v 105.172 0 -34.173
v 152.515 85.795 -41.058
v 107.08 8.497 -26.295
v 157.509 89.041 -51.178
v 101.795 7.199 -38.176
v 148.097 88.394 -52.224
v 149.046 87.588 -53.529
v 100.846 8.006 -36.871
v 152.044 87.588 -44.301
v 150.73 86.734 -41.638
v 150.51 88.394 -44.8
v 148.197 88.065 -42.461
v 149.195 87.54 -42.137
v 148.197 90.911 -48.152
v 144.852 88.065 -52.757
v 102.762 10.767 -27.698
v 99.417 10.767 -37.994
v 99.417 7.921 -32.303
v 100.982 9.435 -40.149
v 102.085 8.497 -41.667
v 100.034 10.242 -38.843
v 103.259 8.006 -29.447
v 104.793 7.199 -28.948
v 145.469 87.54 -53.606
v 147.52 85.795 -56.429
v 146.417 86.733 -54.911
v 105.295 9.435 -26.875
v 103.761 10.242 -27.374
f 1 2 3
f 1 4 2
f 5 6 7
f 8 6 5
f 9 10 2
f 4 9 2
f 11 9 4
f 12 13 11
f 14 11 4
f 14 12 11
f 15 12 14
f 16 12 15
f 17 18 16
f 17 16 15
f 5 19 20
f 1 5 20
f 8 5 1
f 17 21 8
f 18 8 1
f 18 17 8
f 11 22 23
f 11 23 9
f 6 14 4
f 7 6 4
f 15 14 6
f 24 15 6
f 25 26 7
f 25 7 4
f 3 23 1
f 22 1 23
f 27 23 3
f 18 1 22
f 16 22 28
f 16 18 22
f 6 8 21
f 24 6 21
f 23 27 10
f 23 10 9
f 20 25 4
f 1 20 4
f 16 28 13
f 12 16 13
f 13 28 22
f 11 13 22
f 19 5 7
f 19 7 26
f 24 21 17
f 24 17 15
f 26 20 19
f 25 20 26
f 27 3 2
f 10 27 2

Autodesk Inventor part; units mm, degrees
sketch "Boceto1" plane through (0, 0, 0) normal (0, 1, 0) x (-1, 0, 0)
  line L0 (65, 89.4648) -> (105.1722, -34.1725)
  line L1 (105.1722, -34.1725) -> (0, -110.5846)
  line L2 (0, -110.5846) -> (-105.1722, -34.1725)
  line L3 (-105.1722, -34.1725) -> (-65, 89.4648)
  line L4 (-65, 89.4648) -> (65, 89.4648)
  line L5 (0, 0) -> (178.9296, 0) construction
  line L6 (178.9296, 0) -> (178.9296, 178.9296) construction
  line L7 (178.9296, 178.9296) -> (0, 178.9296) construction
  line L8 (0, 178.9296) -> (0, 0) construction
  line L9 (178.9296, 178.9296) -> (0, 89.4648)
  dimension "d1" = 289.5143
  dimension "d2" = 26.565
  dimension "d108" = 130
extrude "Extrusión1" add sketch "Boceto1" along normal blind 289.5143 draft 26.565
sketch "Boceto2" plane through (0, 289.5143, 0) normal (0, 1, 0) x (1, 0, 0)
  line L0 (0, -80.8118) -> (-76.8566, -24.9722)
  line L1 (-76.8566, -24.9722) -> (-47.5, 65.3781)
  line L2 (-47.5, 65.3781) -> (47.5, 65.3781)
  line L3 (47.5, 65.3781) -> (76.8566, -24.9722)
  line L4 (76.8566, -24.9722) -> (0, -80.8118)
  point P0 (0, 0)
  point P1 (0, 0)
  dimension "L" = 95
extrude "Extrusión2" cut sketch "Boceto2" against normal blind 289.5143 draft 26.565 keep common part
sketch "Boceto3" plane through (65, 0, 89.4648) normal (0.8506508, -0.4472136, 0.2763932) x (0.309017, 0, -0.9510565)
  line L0 (65, 170.2767) -> (162.346, 99.5507) projected
  line L1 (-32.346, 99.5507) -> (65, 170.2767) projected
  line L2 (0, 0) -> (-32.346, 99.5507) projected
  line L3 (0, 0) -> (130, 0) projected
  line L4 (130, 0) -> (162.346, 99.5507) projected
  line L5 (151.1781, 95.922) -> (65, 158.534)
  line L6 (65, 158.534) -> (-21.1781, 95.922)
  line L7 (-21.1781, 95.922) -> (6.9022, 9.5)
  line L8 (6.9022, 9.5) -> (123.0978, 9.5)
  line L9 (123.0978, 9.5) -> (151.1781, 95.922)
  point P0 (65, -40.0099)
  dimension "D" = 9.5
extrude "Extrusión3" cut sketch "Boceto3" against normal blind 189.5143 contours L9 L8 L7 L6 L5
sketch "Boceto4" plane through (105.1722, 0, -34.1725) normal (0.5257311, -0.4472136, -0.7236068) x (-0.809017, 0, -0.5877853)
  line L0 (65, 170.2767) -> (162.346, 99.5507) projected
  line L1 (-32.346, 99.5507) -> (65, 170.2767) projected
  line L2 (0, 0) -> (-32.346, 99.5507) projected
  line L3 (0, 0) -> (130, 0) projected
  line L4 (130, 0) -> (162.346, 99.5507) projected
  line L5 (123.0978, 9.5) -> (6.9022, 9.5)
  line L6 (6.9022, 9.5) -> (-21.1781, 95.922)
  line L7 (-21.1781, 95.922) -> (65, 158.534)
  line L8 (65, 158.534) -> (151.1781, 95.922)
  line L9 (151.1781, 95.922) -> (123.0978, 9.5)
  point P0 (65, -40.0099)
  dimension "d14" = 9.5
extrude "Extrusión4" cut sketch "Boceto4" against normal blind 189.5143 contours L5 L6 L7 L8 L9
sketch "Boceto5" plane through (0, 0, 0) normal (0, -1, 0) x (1, 0, 0)
  line L0 (105.1722, -34.1725) -> (0, -110.5846) projected
  line L1 (65, 89.4648) -> (105.1722, -34.1725) projected
  line L2 (-65, 89.4648) -> (65, 89.4648) projected
  line L3 (-105.1722, -34.1725) -> (-65, 89.4648) projected
  line L4 (0, -110.5846) -> (-105.1722, -34.1725) projected
  line L5 (58.0978, 79.9648) -> (94.0043, -30.5438)
  line L6 (94.0043, -30.5438) -> (0, -98.842)
  line L7 (0, -98.842) -> (-94.0043, -30.5438)
  line L8 (-94.0043, -30.5438) -> (-58.0978, 79.9648)
  line L9 (-58.0978, 79.9648) -> (58.0978, 79.9648)
  point P0 (0, 0)
  dimension "d17" = 9.5
extrude "Extrusión5" cut sketch "Boceto5" against normal blind 189.5143 contours L5 L6 L7 L8 L9
sketch "Boceto6" plane through (47.5, 289.5143, -65.3781) normal (0, 0.4472136, -0.8944272) x (-1, 0, 0)
  line L0 (47.5, -224.1361) -> (144.846, -153.4101) projected
  line L1 (95, 0) -> (144.846, -153.4101) projected
  line L2 (95, 0) -> (0, 0) projected
  line L3 (0, 0) -> (-49.846, -153.4101) projected
  line L4 (-49.846, -153.4101) -> (47.5, -224.1361) projected
  line L5 (133.6781, -149.7814) -> (47.5, -212.3935)
  line L6 (47.5, -212.3935) -> (-38.6781, -149.7814)
  line L7 (-38.6781, -149.7814) -> (6.9022, -9.5)
  line L8 (6.9022, -9.5) -> (88.0978, -9.5)
  line L9 (88.0978, -9.5) -> (133.6781, -149.7814)
  point P0 (47.5, -229.7114)
  dimension "d20" = 9.5
extrude "Extrusión6" cut sketch "Boceto6" against normal blind 189.5143 contours L5 L6 L7 L8 L9
sketch "Boceto7" plane through (0, 0, -110.5846) normal (-0.5257311, -0.4472136, -0.7236068) x (-0.809017, 0, 0.5877853)
  line L0 (65, 170.2767) -> (162.346, 99.5507) projected
  line L1 (-32.346, 99.5507) -> (65, 170.2767) projected
  line L2 (0, 0) -> (-32.346, 99.5507) projected
  line L3 (0, 0) -> (130, 0) projected
  line L4 (130, 0) -> (162.346, 99.5507) projected
  line L5 (151.1781, 95.922) -> (65, 158.534)
  line L6 (65, 158.534) -> (-21.1781, 95.922)
  line L7 (-21.1781, 95.922) -> (6.9022, 9.5)
  line L8 (6.9022, 9.5) -> (123.0978, 9.5)
  line L9 (123.0978, 9.5) -> (151.1781, 95.922)
  point P0 (65, -40.0099)
  dimension "d23" = 9.5
extrude "Extrusión7" cut sketch "Boceto7" against normal blind 189.5143 contours L9 L8 L7 L6 L5
sketch "Boceto8" plane through (76.8566, 289.5143, 24.9722) normal (0.8506508, 0.4472136, -0.2763932) x (-0.309017, 0, -0.9510565)
  line L0 (47.5, -224.1361) -> (144.846, -153.4101) projected
  line L1 (95, 0) -> (144.846, -153.4101) projected
  line L2 (95, 0) -> (0, 0) projected
  line L3 (0, 0) -> (-49.846, -153.4101) projected
  line L4 (-49.846, -153.4101) -> (47.5, -224.1361) projected
  line L5 (47.5, -212.3935) -> (133.6781, -149.7814)
  line L6 (133.6781, -149.7814) -> (88.0978, -9.5)
  line L7 (88.0978, -9.5) -> (6.9022, -9.5)
  line L8 (6.9022, -9.5) -> (-38.6781, -149.7814)
  line L9 (-38.6781, -149.7814) -> (47.5, -212.3935)
  point P0 (47.5, -229.7114)
  dimension "d26" = 9.5
extrude "Extrusión8" cut sketch "Boceto8" against normal blind 189.5143 contours L9 L8 L7 L6 L5
sketch "Boceto9" plane through (0, 289.5143, 0) normal (0, 1, 0) x (1, 0, 0)
  line L0 (78.7643, -17.095) -> (-82.4461, -69.4755) projected
  line L1 (-47.5, 65.3781) -> (47.5, 65.3781) projected
  line L2 (-76.8566, -24.9722) -> (-47.5, 65.3781) projected
  line L3 (0, -80.8118) -> (-76.8566, -24.9722) projected
  line L4 (76.8566, -24.9722) -> (0, -80.8118) projected
  line L5 (47.5, 65.3781) -> (76.8566, -24.9722) projected
  line L6 (0, -69.0692) -> (-65.6887, -21.3436)
  line L7 (-65.6887, -21.3436) -> (-40.5978, 55.8781)
  line L8 (-40.5978, 55.8781) -> (40.5978, 55.8781)
  line L9 (40.5978, 55.8781) -> (65.6887, -21.3436)
  line L10 (65.6887, -21.3436) -> (0, -69.0692)
  point P0 (0, 0)
  dimension "d29" = 9.5
extrude "Extrusión9" cut sketch "Boceto9" against normal blind 189.5143 contours L10 L6 L0 | L0 L6 L7 L8 L9
sketch "Boceto10" plane through (-47.5, 289.5143, -65.3781) normal (-0.8506508, 0.4472136, -0.2763932) x (-0.309017, 0, 0.9510565)
  line L0 (-49.846, -153.4101) -> (47.5, -224.1361) projected
  line L1 (47.5, -224.1361) -> (144.846, -153.4101) projected
  line L2 (95, 0) -> (144.846, -153.4101) projected
  line L3 (95, 0) -> (0, 0) projected
  line L4 (0, 0) -> (-49.846, -153.4101) projected
  line L5 (133.6781, -149.7814) -> (47.5, -212.3935)
  line L6 (47.5, -212.3935) -> (-38.6781, -149.7814)
  line L7 (-38.6781, -149.7814) -> (6.9022, -9.5)
  line L8 (6.9022, -9.5) -> (88.0978, -9.5)
  line L9 (88.0978, -9.5) -> (133.6781, -149.7814)
  point P0 (47.5, -229.7114)
  dimension "d32" = 9.5
extrude "Extrusión10" cut sketch "Boceto10" against normal blind 189.5143 contours L5 L6 L7 L8 L9
sketch "Boceto11" plane through (-105.1722, 0, -34.1725) normal (-0.8506508, -0.4472136, 0.2763932) x (0.309017, 0, 0.9510565)
  line L0 (93.5693, 85.4327) -> (113.4241, 91.884) projected
  line L1 (-32.346, 99.5507) -> (65, 170.2767) projected
  line L2 (0, 0) -> (-32.346, 99.5507) projected
  line L3 (0, 0) -> (130, 0) projected
  line L4 (130, 0) -> (162.346, 99.5507) projected
  line L5 (65, 170.2767) -> (162.346, 99.5507) projected
  line L6 (151.1781, 95.922) -> (123.0978, 9.5)
  line L7 (123.0978, 9.5) -> (6.9022, 9.5)
  line L8 (6.9022, 9.5) -> (-21.1781, 95.922)
  line L9 (-21.1781, 95.922) -> (65, 158.534)
  line L10 (65, 158.534) -> (151.1781, 95.922)
  point P0 (65, -40.0099)
  point P1 (48.882, 67.2803)
  point P2 (90.6407, 79.3954)
  point P3 (78.7461, 79.1633)
  dimension "d35" = 9.5
extrude "Extrusión11" cut sketch "Boceto11" against normal blind 189.5143 contours L6 L7 L8 L9 L10
sketch "Boceto12" plane through (-65, 0, 89.4648) normal (0, -0.4472136, 0.8944272) x (1, 0, 0)
  line L0 (6.9022, 9.5) -> (97.7716, 134.5711) projected
  line L1 (-32.346, 99.5507) -> (65, 170.2767) projected
  line L2 (0, 0) -> (-32.346, 99.5507) projected
  line L3 (0, 0) -> (130, 0) projected
  line L4 (130, 0) -> (162.346, 99.5507) projected
  line L5 (65, 170.2767) -> (162.346, 99.5507) projected
  line L6 (151.1781, 95.922) -> (123.0978, 9.5)
  line L7 (123.0978, 9.5) -> (6.9022, 9.5)
  line L8 (6.9022, 9.5) -> (-21.1781, 95.922)
  line L9 (-21.1781, 95.922) -> (65, 158.534)
  line L10 (65, 158.534) -> (151.1781, 95.922)
  point P0 (65, -40.0099)
  point P1 (52.5, 72.2601)
  point P2 (45.5555, 62.7017)
  dimension "d38" = 9.5
extrude "Extrusión12" cut sketch "Boceto12" against normal blind 189.5143 contours L6 L7 L8 L9 L10
sketch "Boceto13" plane through (0, 289.5143, 80.8118) normal (0.5257311, 0.4472136, 0.7236068) x (0.809017, 0, -0.5877853)
  line L0 (-49.846, -153.4101) -> (47.5, -224.1361) projected
  line L1 (47.5, -224.1361) -> (144.846, -153.4101) projected
  line L2 (95, 0) -> (144.846, -153.4101) projected
  line L3 (95, 0) -> (0, 0) projected
  line L4 (0, 0) -> (-49.846, -153.4101) projected
  line L5 (47.5, -212.3935) -> (-38.6781, -149.7814)
  line L6 (-38.6781, -149.7814) -> (6.9022, -9.5)
  line L7 (6.9022, -9.5) -> (88.0978, -9.5)
  line L8 (88.0978, -9.5) -> (133.6781, -149.7814)
  line L9 (133.6781, -149.7814) -> (47.5, -212.3935)
  point P0 (47.5, -229.7114)
  dimension "d41" = 9.5
extrude "Extrusión13" cut sketch "Boceto13" against normal blind 189.5143 contours L5 L6 L7 L8 L9
sketch "Boceto14" plane through (-76.8566, 289.5143, 24.9722) normal (-0.5257311, 0.4472136, 0.7236068) x (0.809017, 0, 0.5877853)
  line L0 (-49.846, -153.4101) -> (47.5, -224.1361) projected
  line L1 (47.5, -224.1361) -> (144.846, -153.4101) projected
  line L2 (95, 0) -> (144.846, -153.4101) projected
  line L3 (95, 0) -> (0, 0) projected
  line L4 (0, 0) -> (-49.846, -153.4101) projected
  line L5 (-38.6781, -149.7814) -> (47.5, -212.3935)
  line L6 (47.5, -212.3935) -> (133.6781, -149.7814)
  line L7 (133.6781, -149.7814) -> (88.0978, -9.5)
  line L8 (88.0978, -9.5) -> (6.9022, -9.5)
  line L9 (6.9022, -9.5) -> (-38.6781, -149.7814)
  point P0 (47.5, -229.7114)
  dimension "d44" = 9.5
extrude "Extrusión14" cut sketch "Boceto14" against normal blind 189.5143 contours L9 L8 L7 L6 L5
ref_plane "Plano de trabajo1" through (47.5, 288.1726, -62.6949) normal (0, 0.4472136, -0.8944272) x (-1, 0, 0)
sketch "Boceto15" plane through (47.5, 288.1726, -62.6949) normal (0, 0.4472136, -0.8944272) x (-1, 0, 0)
  line L0 (6.9022, -9.5) -> (88.0978, -9.5) projected
  line L1 (-38.6781, -149.7814) -> (6.9022, -9.5) projected
  line L2 (47.5, -212.3935) -> (-38.6781, -149.7814) projected
  line L3 (133.6781, -149.7814) -> (47.5, -212.3935) projected
  line L4 (88.0978, -9.5) -> (133.6781, -149.7814) projected
  line L5 (5.0858, -7) -> (89.9142, -7)
  line L6 (89.9142, -7) -> (136.617, -150.7364)
  line L7 (136.617, -150.7364) -> (47.5, -215.4836)
  line L8 (47.5, -215.4836) -> (-41.617, -150.7364)
  line L9 (-41.617, -150.7364) -> (5.0858, -7)
  point P0 (47.5, -229.7114)
  dimension "D2" = 2.5
extrude "Extrusión15" cut sketch "Boceto15" along normal mid plane 1.8 contours L0 L4 L3 L2 L1 | L5 L6 L7 L8 L9
ref_plane "Plano de trabajo2" through (103.595, 1.3416, -32.0017) normal (0.5257311, -0.4472136, -0.7236068) x (-0.809017, 0, -0.5877853)
sketch "Boceto16" plane through (103.595, 1.3416, -32.0017) normal (0.5257311, -0.4472136, -0.7236068) x (-0.809017, 0, -0.5877853)
  line L0 (123.0978, 9.5) -> (6.9022, 9.5) projected
  line L1 (151.1781, 95.922) -> (123.0978, 9.5) projected
  line L2 (65, 158.534) -> (151.1781, 95.922) projected
  line L3 (-21.1781, 95.922) -> (65, 158.534) projected
  line L4 (6.9022, 9.5) -> (-21.1781, 95.922) projected
  line L5 (5.0858, 7) -> (124.9142, 7)
  line L6 (124.9142, 7) -> (154.117, 96.8769)
  line L7 (154.117, 96.8769) -> (65, 161.6242)
  line L8 (65, 161.6242) -> (-24.117, 96.8769)
  line L9 (-24.117, 96.8769) -> (5.0858, 7)
  point P0 (65, -40.0099)
  dimension "d52" = 2.5
extrude "Extrusión16" cut sketch "Boceto16" along normal mid plane 1.8
ref_plane "Plano de trabajo3" through (74.3047, 288.1726, 25.8014) normal (0.8506508, 0.4472136, -0.2763932) x (-0.309017, 0, -0.9510565)
sketch "Boceto17" plane through (74.3047, 288.1726, 25.8014) normal (0.8506508, 0.4472136, -0.2763932) x (-0.309017, 0, -0.9510565)
  line L0 (47.5, -212.3935) -> (-38.6781, -149.7814) projected
  line L1 (133.6781, -149.7814) -> (47.5, -212.3935) projected
  line L2 (88.0978, -9.5) -> (133.6781, -149.7814) projected
  line L3 (6.9022, -9.5) -> (88.0978, -9.5) projected
  line L4 (-38.6781, -149.7814) -> (6.9022, -9.5) projected
  line L5 (-41.617, -150.7364) -> (47.5, -215.4836)
  line L6 (47.5, -215.4836) -> (136.617, -150.7364)
  line L7 (136.617, -150.7364) -> (89.9142, -7)
  line L8 (89.9142, -7) -> (5.0858, -7)
  line L9 (5.0858, -7) -> (-41.617, -150.7364)
  point P0 (47.5, -229.7114)
  dimension "d56" = 2.5
extrude "Extrusión17" cut sketch "Boceto17" along normal mid plane 1.8
ref_plane "Plano de trabajo4" through (1.5772, 1.3416, -108.4138) normal (-0.5257311, -0.4472136, -0.7236068) x (-0.809017, 0, 0.5877853)
sketch "Boceto18" plane through (1.5772, 1.3416, -108.4138) normal (-0.5257311, -0.4472136, -0.7236068) x (-0.809017, 0, 0.5877853)
  line L0 (151.1781, 95.922) -> (123.0978, 9.5) projected
  line L1 (65, 158.534) -> (151.1781, 95.922) projected
  line L2 (-21.1781, 95.922) -> (65, 158.534) projected
  line L3 (6.9022, 9.5) -> (-21.1781, 95.922) projected
  line L4 (123.0978, 9.5) -> (6.9022, 9.5) projected
  line L5 (124.9142, 7) -> (154.117, 96.8769)
  line L6 (154.117, 96.8769) -> (65, 161.6242)
  line L7 (65, 161.6242) -> (-24.117, 96.8769)
  line L8 (-24.117, 96.8769) -> (5.0858, 7)
  line L9 (5.0858, 7) -> (124.9142, 7)
  point P0 (65, -40.0099)
  dimension "d60" = 2.5
extrude "Extrusión18" cut sketch "Boceto18" along normal mid plane 1.8 contours L0 L4 L3 L2 L1 | L9 L8 L7 L6 L5
ref_plane "Plano de trabajo5" through (0, 3, 0) normal (0, -1, 0) x (1, 0, 0)
sketch "Boceto19" plane through (0, 3, 0) normal (0, -1, 0) x (1, 0, 0)
  line L0 (0, -98.842) -> (-94.0043, -30.5438) projected
  line L1 (-94.0043, -30.5438) -> (-58.0978, 79.9648) projected
  line L2 (-58.0978, 79.9648) -> (58.0978, 79.9648) projected
  line L3 (58.0978, 79.9648) -> (94.0043, -30.5438) projected
  line L4 (94.0043, -30.5438) -> (0, -98.842) projected
  line L5 (105.1722, -34.1725) -> (0, -110.5846) projected
  line L6 (65, 89.4648) -> (105.1722, -34.1725) projected
  line L7 (-65, 89.4648) -> (65, 89.4648) projected
  line L8 (-105.1722, -34.1725) -> (-65, 89.4648) projected
  line L9 (0, -110.5846) -> (-105.1722, -34.1725) projected
  line L10 (-59.9142, 82.4648) -> (-96.9432, -31.4988)
  line L11 (-96.9432, -31.4988) -> (0, -101.9321)
  line L12 (0, -101.9321) -> (96.9432, -31.4988)
  line L13 (96.9432, -31.4988) -> (59.9142, 82.4648)
  line L14 (59.9142, 82.4648) -> (-59.9142, 82.4648)
  point P0 (0, 0)
  dimension "d64" = 2.5
extrude "Extrusión19" cut sketch "Boceto19" along normal mid plane 1.8 contours L0 L1 L2 L3 L4 | L14 L13 L12 L11 L10
ref_plane "Plano de trabajo6" through (62.448, 1.3416, 88.6356) normal (0.8506508, -0.4472136, 0.2763932) x (0.309017, 0, -0.9510565)
sketch "Boceto20" plane through (62.448, 1.3416, 88.6356) normal (0.8506508, -0.4472136, 0.2763932) x (0.309017, 0, -0.9510565)
  line L0 (6.9022, 9.5) -> (-21.1781, 95.922) projected
  line L1 (-21.1781, 95.922) -> (65, 158.534) projected
  line L2 (65, 158.534) -> (151.1781, 95.922) projected
  line L3 (151.1781, 95.922) -> (123.0978, 9.5) projected
  line L4 (123.0978, 9.5) -> (6.9022, 9.5) projected
  line L5 (65, 170.2767) -> (162.346, 99.5507) projected
  line L6 (-32.346, 99.5507) -> (65, 170.2767) projected
  line L7 (0, 0) -> (-32.346, 99.5507) projected
  line L8 (0, 0) -> (130, 0) projected
  line L9 (130, 0) -> (162.346, 99.5507) projected
  line L10 (-24.117, 96.8769) -> (5.0858, 7)
  line L11 (5.0858, 7) -> (124.9142, 7)
  line L12 (124.9142, 7) -> (154.117, 96.8769)
  line L13 (154.117, 96.8769) -> (65, 161.6242)
  line L14 (65, 161.6242) -> (-24.117, 96.8769)
  point P0 (65, -40.0099)
  dimension "d68" = 2.5
extrude "Extrusión20" cut sketch "Boceto20" along normal mid plane 1.8 contours L0 L1 L2 L3 L4 | L14 L13 L12 L11 L10
ref_plane "Plano de trabajo7" through (152.5146, 99.5438, -49.555) normal (-0.309017, 0, -0.9510565) x (-0.8506508, -0.4472136, 0.2763932)
split body "Dividir1" result two bodies by plane through (152.5146, 99.5438, -49.555) normal (-0.309017, 0, -0.9510565) first body at (-65.7478, 240.7202, -86.3585)
ref_plane "Plano de trabajo8" through (147.5202, 85.7952, -56.4293) normal (0, -0.8506508, 0.5257311) x (-0.5257311, 0.4472136, 0.7236068)
split "Dividir2" plane through (147.5202, 85.7952, -56.4293) removes the side toward (0, 0.8506508, -0.5257311)
ref_plane "Plano de trabajo9" through (152.5146, 85.7952, -41.058) normal (-0.309017, -0.8506508, -0.4253254) x (-0.8506508, 0.4472136, -0.2763932)
split "Dividir3" plane through (152.5146, 85.7952, -41.058) removes the side toward (0.309017, 0.8506508, 0.4253254)
ref_plane "Plano de trabajo13" through (47.0021, 15.3713, -64.6929) normal (-0.5, -0.5257311, 0.688191) x (0.809017, 0, 0.5877853)
split "Dividir7" plane through (47.0021, 15.3713, -64.6929) removes the side toward (-0.5, -0.5257311, 0.688191)
ref_plane "Plano de trabajo14" through (102.0855, 8.4971, -41.6666) normal (-0.809017, -0.5257311, -0.2628656) x (-0.5257311, 0.4472136, 0.7236068)
split "Dividir8" plane through (102.0855, 8.4971, -41.6666) removes the side toward (-0.809017, -0.5257311, -0.2628656)
ref_plane "Plano de trabajo16" through (137.7424, 69.9535, -38.414) normal (-0.809017, 0.5257311, 0.2628656) x (0.5, 0.8506508, -0.1624598)
ref_plane "Plano de trabajo15" through (138.5514, 69.4278, -38.6769) normal (-0.809017, 0.5257311, 0.2628656) x (0.5, 0.8506508, -0.1624598)
combine bodies "Combinar1" operation type add bodies to combine 2 3
split "Dividir9" plane through (137.7424, 69.9535, -38.414) removes the side toward (-0.809017, 0.5257311, 0.2628656)
sketch "Boceto25" plane through (99.4171, 10.7669, -37.9939) normal (-0.809017, 0.5257311, 0.2628656) x (0.309017, 0, 0.9510565)
  line L0 (5.4128, -6.9022) -> (5.4128, 97.7716) projected
  line L1 (0, 90.8695) -> (5.4128, 94.2147) projected
  line L2 (0, 0) -> (0, 90.8695) projected
  line L3 (5.4128, -3.3453) -> (0, 0) projected
  line L4 (10.8256, 0) -> (5.4128, -3.3453) projected
  line L5 (10.8256, 90.8695) -> (10.8256, 0) projected
  line L6 (5.4128, 94.2147) -> (10.8256, 90.8695) projected
  point P0 (5.4128, -65.0399)
  dimension "d109" = 10.8256
equation "\"d3\" = d1"
equation "\"d4\" = d2"
equation "\"d6\" = d1"
equation "\"d7\" = d2"
equation "\"d14\" = D"
equation "\"d17\" = D"
equation "\"d20\" = D"
equation "\"d23\" = D"
equation "\"d26\" = D"
equation "\"d29\" = D"
equation "\"d32\" = D"
equation "\"d35\" = D"
equation "\"d38\" = D"
equation "\"d41\" = D"
equation "\"d44\" = D"
equation "\"d48\" = ESP"
equation "\"d52\" = D2"
equation "\"d56\" = D2"
equation "\"d57\" = ESP"
equation "\"d60\" = D2"
equation "\"d61\" = ESP"
equation "\"d64\" = D2"
equation "\"d65\" = ESP"
equation "\"d68\" = D2"
equation "\"d69\" = ESP"
equation "\"d51\" = P"
equation "\"d55\" = P"
equation "\"d59\" = P"
equation "\"d63\" = P"
equation "\"d67\" = P"
equation "\"ESP\" = 1.8"
equation "\"P\" = -3"
properties part number "Perfil_V2"
